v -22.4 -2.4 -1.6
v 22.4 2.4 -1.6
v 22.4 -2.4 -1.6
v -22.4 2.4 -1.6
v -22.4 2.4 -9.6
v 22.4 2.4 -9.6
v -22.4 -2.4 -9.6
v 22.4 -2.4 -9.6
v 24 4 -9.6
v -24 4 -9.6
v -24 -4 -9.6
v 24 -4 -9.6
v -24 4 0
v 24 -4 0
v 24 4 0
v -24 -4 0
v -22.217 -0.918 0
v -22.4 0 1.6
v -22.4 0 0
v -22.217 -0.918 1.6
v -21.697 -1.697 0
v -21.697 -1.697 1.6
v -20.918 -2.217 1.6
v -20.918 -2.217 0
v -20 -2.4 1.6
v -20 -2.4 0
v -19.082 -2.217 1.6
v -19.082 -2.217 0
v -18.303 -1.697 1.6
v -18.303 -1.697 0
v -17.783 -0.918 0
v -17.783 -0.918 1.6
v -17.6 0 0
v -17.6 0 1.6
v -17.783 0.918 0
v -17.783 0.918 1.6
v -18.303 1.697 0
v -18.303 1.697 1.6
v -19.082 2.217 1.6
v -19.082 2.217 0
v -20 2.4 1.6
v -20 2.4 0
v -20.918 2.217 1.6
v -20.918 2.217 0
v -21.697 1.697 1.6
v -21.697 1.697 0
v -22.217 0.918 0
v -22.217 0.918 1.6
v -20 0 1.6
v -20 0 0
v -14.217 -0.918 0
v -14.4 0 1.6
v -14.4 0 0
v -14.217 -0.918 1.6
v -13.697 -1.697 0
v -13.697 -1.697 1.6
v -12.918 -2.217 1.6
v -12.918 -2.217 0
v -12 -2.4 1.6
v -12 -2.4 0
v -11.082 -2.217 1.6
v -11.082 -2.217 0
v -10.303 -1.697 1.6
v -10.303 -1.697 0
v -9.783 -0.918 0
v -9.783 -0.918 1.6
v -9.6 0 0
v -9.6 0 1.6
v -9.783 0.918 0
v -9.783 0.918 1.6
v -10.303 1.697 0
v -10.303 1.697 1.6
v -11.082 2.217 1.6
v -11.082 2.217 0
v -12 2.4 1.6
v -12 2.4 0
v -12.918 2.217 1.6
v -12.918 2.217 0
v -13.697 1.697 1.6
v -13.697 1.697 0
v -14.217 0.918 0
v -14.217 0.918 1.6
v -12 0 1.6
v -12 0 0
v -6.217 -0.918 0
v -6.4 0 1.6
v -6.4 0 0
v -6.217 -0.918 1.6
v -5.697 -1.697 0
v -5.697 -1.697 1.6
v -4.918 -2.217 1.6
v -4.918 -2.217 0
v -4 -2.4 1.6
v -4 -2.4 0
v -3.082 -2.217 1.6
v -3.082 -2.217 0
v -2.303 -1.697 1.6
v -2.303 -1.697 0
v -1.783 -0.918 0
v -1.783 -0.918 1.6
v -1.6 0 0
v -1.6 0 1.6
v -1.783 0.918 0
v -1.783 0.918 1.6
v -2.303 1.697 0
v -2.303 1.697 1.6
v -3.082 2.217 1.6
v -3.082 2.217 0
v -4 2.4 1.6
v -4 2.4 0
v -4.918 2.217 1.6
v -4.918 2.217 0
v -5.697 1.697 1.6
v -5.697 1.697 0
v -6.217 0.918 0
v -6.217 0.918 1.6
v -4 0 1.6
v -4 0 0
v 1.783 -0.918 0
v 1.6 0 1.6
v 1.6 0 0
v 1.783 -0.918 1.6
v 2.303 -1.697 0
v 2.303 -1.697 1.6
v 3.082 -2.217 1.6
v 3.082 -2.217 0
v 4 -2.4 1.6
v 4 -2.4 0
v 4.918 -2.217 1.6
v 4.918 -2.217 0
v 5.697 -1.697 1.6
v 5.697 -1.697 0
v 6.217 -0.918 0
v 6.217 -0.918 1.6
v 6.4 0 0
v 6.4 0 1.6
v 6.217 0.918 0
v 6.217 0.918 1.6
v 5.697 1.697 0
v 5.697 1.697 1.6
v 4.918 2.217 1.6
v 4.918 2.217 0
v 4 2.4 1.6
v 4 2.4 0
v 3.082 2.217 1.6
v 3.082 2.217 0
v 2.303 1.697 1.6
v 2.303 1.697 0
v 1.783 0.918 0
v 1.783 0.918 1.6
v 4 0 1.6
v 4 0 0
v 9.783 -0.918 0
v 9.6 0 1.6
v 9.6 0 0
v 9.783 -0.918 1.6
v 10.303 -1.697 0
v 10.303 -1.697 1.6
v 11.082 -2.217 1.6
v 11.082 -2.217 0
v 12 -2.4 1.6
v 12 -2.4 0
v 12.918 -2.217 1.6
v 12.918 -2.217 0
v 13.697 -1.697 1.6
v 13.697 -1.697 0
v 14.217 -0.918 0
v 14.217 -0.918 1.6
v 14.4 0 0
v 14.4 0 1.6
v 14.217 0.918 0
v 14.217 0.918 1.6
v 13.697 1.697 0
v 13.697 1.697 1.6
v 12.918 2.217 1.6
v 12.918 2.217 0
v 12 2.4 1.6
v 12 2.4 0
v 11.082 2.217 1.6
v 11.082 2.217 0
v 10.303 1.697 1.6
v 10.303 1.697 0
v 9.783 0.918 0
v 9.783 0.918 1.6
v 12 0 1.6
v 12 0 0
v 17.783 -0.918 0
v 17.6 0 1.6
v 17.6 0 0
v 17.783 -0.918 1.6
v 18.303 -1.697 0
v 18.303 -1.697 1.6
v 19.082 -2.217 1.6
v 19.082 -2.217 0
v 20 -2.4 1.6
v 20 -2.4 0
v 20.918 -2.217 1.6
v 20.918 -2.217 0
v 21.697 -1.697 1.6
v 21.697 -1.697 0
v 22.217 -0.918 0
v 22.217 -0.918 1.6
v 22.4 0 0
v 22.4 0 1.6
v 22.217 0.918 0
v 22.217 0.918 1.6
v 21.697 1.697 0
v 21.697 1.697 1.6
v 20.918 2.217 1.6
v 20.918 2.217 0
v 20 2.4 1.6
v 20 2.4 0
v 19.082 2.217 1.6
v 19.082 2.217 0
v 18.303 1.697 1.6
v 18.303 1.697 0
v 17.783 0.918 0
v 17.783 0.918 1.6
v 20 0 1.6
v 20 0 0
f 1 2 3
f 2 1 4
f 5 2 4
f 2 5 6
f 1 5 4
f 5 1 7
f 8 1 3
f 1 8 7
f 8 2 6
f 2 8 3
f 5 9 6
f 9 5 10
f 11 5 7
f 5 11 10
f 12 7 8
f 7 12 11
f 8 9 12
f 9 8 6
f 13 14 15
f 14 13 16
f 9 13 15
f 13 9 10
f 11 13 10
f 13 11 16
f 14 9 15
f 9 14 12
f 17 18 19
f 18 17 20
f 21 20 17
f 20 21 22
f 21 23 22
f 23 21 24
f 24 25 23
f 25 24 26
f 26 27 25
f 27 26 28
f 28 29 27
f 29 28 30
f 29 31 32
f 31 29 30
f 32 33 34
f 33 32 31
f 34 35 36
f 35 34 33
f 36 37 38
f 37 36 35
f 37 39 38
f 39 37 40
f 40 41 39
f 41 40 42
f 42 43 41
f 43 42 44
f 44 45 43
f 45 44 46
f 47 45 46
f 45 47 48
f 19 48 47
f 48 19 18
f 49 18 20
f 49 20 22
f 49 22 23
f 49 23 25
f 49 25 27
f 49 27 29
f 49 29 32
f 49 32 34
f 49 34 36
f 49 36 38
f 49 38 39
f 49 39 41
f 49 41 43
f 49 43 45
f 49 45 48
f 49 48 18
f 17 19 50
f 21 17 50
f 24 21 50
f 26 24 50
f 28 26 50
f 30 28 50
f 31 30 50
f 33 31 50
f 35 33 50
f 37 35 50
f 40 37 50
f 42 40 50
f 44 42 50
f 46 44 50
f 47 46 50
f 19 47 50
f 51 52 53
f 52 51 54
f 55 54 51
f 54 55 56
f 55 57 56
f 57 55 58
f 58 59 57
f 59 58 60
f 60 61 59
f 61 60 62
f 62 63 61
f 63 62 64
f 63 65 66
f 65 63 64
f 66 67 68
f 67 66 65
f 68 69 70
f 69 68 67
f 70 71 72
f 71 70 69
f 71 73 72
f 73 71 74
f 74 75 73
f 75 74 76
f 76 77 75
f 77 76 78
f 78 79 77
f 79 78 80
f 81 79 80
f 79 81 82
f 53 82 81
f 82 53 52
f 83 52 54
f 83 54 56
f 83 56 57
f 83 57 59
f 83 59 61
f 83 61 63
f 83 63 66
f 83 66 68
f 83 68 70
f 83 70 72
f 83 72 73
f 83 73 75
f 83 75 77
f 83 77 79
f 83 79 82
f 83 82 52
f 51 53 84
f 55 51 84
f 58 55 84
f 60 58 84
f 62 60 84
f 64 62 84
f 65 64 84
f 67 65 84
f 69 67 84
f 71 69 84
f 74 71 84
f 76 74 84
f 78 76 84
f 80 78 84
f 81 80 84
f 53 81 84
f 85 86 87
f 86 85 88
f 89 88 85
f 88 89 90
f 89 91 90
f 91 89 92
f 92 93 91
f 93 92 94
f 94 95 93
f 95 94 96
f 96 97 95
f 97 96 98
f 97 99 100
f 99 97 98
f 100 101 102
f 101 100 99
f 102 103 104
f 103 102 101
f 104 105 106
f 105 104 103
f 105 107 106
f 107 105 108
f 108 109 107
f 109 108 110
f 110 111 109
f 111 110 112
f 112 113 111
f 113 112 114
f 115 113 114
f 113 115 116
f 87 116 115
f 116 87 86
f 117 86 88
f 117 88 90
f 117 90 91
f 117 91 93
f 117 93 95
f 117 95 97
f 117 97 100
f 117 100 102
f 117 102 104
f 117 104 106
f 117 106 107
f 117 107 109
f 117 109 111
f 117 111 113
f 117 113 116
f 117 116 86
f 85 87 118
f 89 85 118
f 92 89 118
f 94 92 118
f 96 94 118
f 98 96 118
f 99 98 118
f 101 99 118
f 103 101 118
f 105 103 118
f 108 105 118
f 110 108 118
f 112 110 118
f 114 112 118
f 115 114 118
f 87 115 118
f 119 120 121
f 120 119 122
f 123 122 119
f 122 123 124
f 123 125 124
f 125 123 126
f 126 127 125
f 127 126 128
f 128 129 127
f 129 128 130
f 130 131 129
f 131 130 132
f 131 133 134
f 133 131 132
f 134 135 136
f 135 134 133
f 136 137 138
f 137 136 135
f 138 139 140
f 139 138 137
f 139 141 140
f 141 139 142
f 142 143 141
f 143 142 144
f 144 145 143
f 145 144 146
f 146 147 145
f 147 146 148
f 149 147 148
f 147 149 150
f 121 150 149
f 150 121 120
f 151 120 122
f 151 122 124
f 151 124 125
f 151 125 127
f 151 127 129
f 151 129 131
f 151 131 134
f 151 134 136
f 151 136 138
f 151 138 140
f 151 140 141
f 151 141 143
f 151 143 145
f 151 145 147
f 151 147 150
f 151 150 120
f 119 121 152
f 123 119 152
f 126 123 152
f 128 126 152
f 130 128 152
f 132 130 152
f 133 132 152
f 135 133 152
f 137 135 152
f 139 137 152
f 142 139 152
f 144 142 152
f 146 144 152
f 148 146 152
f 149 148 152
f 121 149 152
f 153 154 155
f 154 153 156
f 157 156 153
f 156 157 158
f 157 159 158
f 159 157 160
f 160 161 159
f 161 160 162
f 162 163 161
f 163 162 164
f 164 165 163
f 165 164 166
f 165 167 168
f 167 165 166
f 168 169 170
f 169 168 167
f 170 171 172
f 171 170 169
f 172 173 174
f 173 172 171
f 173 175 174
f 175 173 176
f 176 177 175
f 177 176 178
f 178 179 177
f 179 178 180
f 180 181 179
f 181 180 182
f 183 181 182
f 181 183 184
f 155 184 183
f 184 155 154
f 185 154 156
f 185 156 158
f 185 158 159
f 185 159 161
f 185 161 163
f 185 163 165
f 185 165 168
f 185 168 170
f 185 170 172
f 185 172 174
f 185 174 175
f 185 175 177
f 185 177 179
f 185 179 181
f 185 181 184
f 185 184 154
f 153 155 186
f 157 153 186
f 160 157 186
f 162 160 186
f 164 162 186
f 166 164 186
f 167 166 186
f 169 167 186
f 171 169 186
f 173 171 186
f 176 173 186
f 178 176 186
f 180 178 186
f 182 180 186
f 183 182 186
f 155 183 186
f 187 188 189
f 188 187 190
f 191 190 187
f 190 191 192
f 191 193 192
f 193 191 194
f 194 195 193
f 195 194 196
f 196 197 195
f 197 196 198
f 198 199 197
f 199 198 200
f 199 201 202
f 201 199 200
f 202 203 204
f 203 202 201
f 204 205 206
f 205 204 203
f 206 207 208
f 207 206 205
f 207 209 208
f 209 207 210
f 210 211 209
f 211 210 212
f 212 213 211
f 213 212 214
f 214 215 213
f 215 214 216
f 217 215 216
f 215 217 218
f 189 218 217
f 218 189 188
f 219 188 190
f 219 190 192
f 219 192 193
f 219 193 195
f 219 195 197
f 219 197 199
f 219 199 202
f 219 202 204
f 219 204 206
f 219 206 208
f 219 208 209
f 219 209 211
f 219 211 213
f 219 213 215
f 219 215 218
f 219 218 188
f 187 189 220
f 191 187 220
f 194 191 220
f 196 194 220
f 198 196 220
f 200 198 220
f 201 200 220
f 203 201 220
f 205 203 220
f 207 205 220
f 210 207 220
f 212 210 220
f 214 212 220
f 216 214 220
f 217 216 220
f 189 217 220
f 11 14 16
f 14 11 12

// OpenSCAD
// file: ../p/4-4edge.scad
use <../lib.scad>
function ldraw_lib__4_4edge() = [
// 0 Circle 1.0
// 0 Name: 4-4edge.dat
// 0 Author: James Jessiman
// 0 !LDRAW_ORG Primitive UPDATE 2017-01
// 0 !LICENSE Licensed under CC BY 2.0 and CC BY 4.0 : see CAreadme.txt
// 
// 0 BFC CERTIFY CCW
  [0,"BFC","CERTIFY"],
  [0,"BFC","CCW"],
// 
// 0 !HISTORY 1998-12-15 [PTadmin] Official Update 1998-10
// 0 !HISTORY 2005-12-28 [PTadmin] Official Update 2005-01
// 0 !HISTORY 2007-06-24 [PTadmin] Header formatted for Contributor Agreement
// 0 !HISTORY 2008-07-01 [PTadmin] Official Update 2008-01
// 0 !HISTORY 2017-01-15 [Steffen] BFCed
// 0 !HISTORY 2017-12-30 [PTadmin] Official Update 2017-01
// 
// 
// 2 24 1 0 0 0.9239 0 0.3827
  [2,24,1,0,0,0.9239,0,0.3827],
// 2 24 0.9239 0 0.3827 0.7071 0 0.7071
  [2,24,0.9239,0,0.3827,0.7071,0,0.7071],
// 2 24 0.7071 0 0.7071 0.3827 0 0.9239
  [2,24,0.7071,0,0.7071,0.3827,0,0.9239],
// 2 24 0.3827 0 0.9239 0 0 1
  [2,24,0.3827,0,0.9239,0,0,1],
// 2 24 0 0 1 -0.3827 0 0.9239
  [2,24,0,0,1,-0.3827,0,0.9239],
// 2 24 -0.3827 0 0.9239 -0.7071 0 0.7071
  [2,24,-0.3827,0,0.9239,-0.7071,0,0.7071],
// 2 24 -0.7071 0 0.7071 -0.9239 0 0.3827
  [2,24,-0.7071,0,0.7071,-0.9239,0,0.3827],
// 2 24 -0.9239 0 0.3827 -1 0 -0
  [2,24,-0.9239,0,0.3827,-1,0,-0],
// 2 24 -1 0 -0 -0.9239 0 -0.3827
  [2,24,-1,0,-0,-0.9239,0,-0.3827],
// 2 24 -0.9239 0 -0.3827 -0.7071 0 -0.7071
  [2,24,-0.9239,0,-0.3827,-0.7071,0,-0.7071],
// 2 24 -0.7071 0 -0.7071 -0.3827 0 -0.9239
  [2,24,-0.7071,0,-0.7071,-0.3827,0,-0.9239],
// 2 24 -0.3827 0 -0.9239 0 0 -1
  [2,24,-0.3827,0,-0.9239,0,0,-1],
// 2 24 0 0 -1 0.3827 0 -0.9239
  [2,24,0,0,-1,0.3827,0,-0.9239],
// 2 24 0.3827 0 -0.9239 0.7071 0 -0.7071
  [2,24,0.3827,0,-0.9239,0.7071,0,-0.7071],
// 2 24 0.7071 0 -0.7071 0.9239 0 -0.3827
  [2,24,0.7071,0,-0.7071,0.9239,0,-0.3827],
// 2 24 0.9239 0 -0.3827 1 0 0
  [2,24,0.9239,0,-0.3827,1,0,0],
];
module ldraw_lib__4_4edge(step=0, col=false, unit=2/5, alt=false, line=0.2, solid=!$preview)
    makepoly(ldraw_lib__4_4edge(), step=step, col=col, unit=unit, alt=alt, line=line, solid=solid);
ldraw_lib__4_4edge(line=0.2);
// file: ../p/4-4disc.scad
use <../lib.scad>
function ldraw_lib__4_4disc() = [
// 0 Disc 1.0
// 0 Name: 4-4disc.dat
// 0 Author: James Jessiman
// 0 !LDRAW_ORG Primitive UPDATE 2002-02
// 0 !LICENSE Licensed under CC BY 2.0 and CC BY 4.0 : see CAreadme.txt
// 
// 0 BFC CERTIFY CCW
  [0,"BFC","CERTIFY"],
  [0,"BFC","CCW"],
// 
// 0 !HISTORY 1998-12-15 [PTadmin] Official Update 1998-10
// 0 !HISTORY 2002-03-23 [sbliss] Added BFC statement
// 0 !HISTORY 2002-04-25 [PTadmin] Official Update 2002-02
// 0 !HISTORY 2007-06-24 [PTadmin] Header formatted for Contributor Agreement
// 0 !HISTORY 2008-07-01 [PTadmin] Official Update 2008-01
// 
// 
// 3 16 0 0 0 1 0 0 0.9239 0 0.3827
  [3,16,0,0,0,1,0,0,0.9239,0,0.3827],
// 3 16 0 0 0 0.9239 0 0.3827 0.7071 0 0.7071
  [3,16,0,0,0,0.9239,0,0.3827,0.7071,0,0.7071],
// 3 16 0 0 0 0.7071 0 0.7071 0.3827 0 0.9239
  [3,16,0,0,0,0.7071,0,0.7071,0.3827,0,0.9239],
// 3 16 0 0 0 0.3827 0 0.9239 0 0 1
  [3,16,0,0,0,0.3827,0,0.9239,0,0,1],
// 3 16 0 0 0 0 0 1 -0.3827 0 0.9239
  [3,16,0,0,0,0,0,1,-0.3827,0,0.9239],
// 3 16 0 0 0 -0.3827 0 0.9239 -0.7071 0 0.7071
  [3,16,0,0,0,-0.3827,0,0.9239,-0.7071,0,0.7071],
// 3 16 0 0 0 -0.7071 0 0.7071 -0.9239 0 0.3827
  [3,16,0,0,0,-0.7071,0,0.7071,-0.9239,0,0.3827],
// 3 16 0 0 0 -0.9239 0 0.3827 -1 0 -0
  [3,16,0,0,0,-0.9239,0,0.3827,-1,0,-0],
// 3 16 0 0 0 -1 0 -0 -0.9239 0 -0.3827
  [3,16,0,0,0,-1,0,-0,-0.9239,0,-0.3827],
// 3 16 0 0 0 -0.9239 0 -0.3827 -0.7071 0 -0.7071
  [3,16,0,0,0,-0.9239,0,-0.3827,-0.7071,0,-0.7071],
// 3 16 0 0 0 -0.7071 0 -0.7071 -0.3827 0 -0.9239
  [3,16,0,0,0,-0.7071,0,-0.7071,-0.3827,0,-0.9239],
// 3 16 0 0 0 -0.3827 0 -0.9239 0 0 -1
  [3,16,0,0,0,-0.3827,0,-0.9239,0,0,-1],
// 3 16 0 0 0 0 0 -1 0.3827 0 -0.9239
  [3,16,0,0,0,0,0,-1,0.3827,0,-0.9239],
// 3 16 0 0 0 0.3827 0 -0.9239 0.7071 0 -0.7071
  [3,16,0,0,0,0.3827,0,-0.9239,0.7071,0,-0.7071],
// 3 16 0 0 0 0.7071 0 -0.7071 0.9239 0 -0.3827
  [3,16,0,0,0,0.7071,0,-0.7071,0.9239,0,-0.3827],
// 3 16 0 0 0 0.9239 0 -0.3827 1 0 0
  [3,16,0,0,0,0.9239,0,-0.3827,1,0,0],
// 0
];
module ldraw_lib__4_4disc(step=0, col=false, unit=2/5, alt=false, line=0.2, solid=!$preview)
    makepoly(ldraw_lib__4_4disc(), step=step, col=col, unit=unit, alt=alt, line=line, solid=solid);
ldraw_lib__4_4disc(line=0.2);
// file: ../p/4-4cyli.scad
use <../lib.scad>
$fa=1; $fs=0.2;
function ldraw_lib__4_4cyli(realsolid=false) = [
// 0 Cylinder 1.0
// 0 Name: 4-4cyli.dat
// 0 Author: James Jessiman
// 0 !LDRAW_ORG Primitive UPDATE 2005-01
// 0 !LICENSE Licensed under CC BY 2.0 and CC BY 4.0 : see CAreadme.txt
// 
// 0 BFC CERTIFY CCW
  [0,"BFC","CERTIFY"],
  [0,"BFC","CCW"],
// 
// 0 !HISTORY 1998-12-15 [PTadmin] Official Update 1998-10
// 0 !HISTORY 2002-03-23 [sbliss] Added BFC statement; merged headers from files in distributions LDraw 0.27 and Complete.
// 0 !HISTORY 2002-04-25 [PTadmin] Official Update 2002-02
// 0 !HISTORY 2004-12-14 [guyvivan] BFC CCW
// 0 !HISTORY 2005-12-28 [PTadmin] Official Update 2005-01
// 0 !HISTORY 2007-06-24 [PTadmin] Header formatted for Contributor Agreement
// 0 !HISTORY 2008-07-01 [PTadmin] Official Update 2008-01
// 
// 
// 4 16 1 1 0 0.9239 1 0.3827 0.9239 0 0.3827 1 0 0
  [4,16,1,1,0,0.9239,1,0.3827,0.9239,0,0.3827,1,0,0],
// 5 24 1 0 0 1 1 0 0.9239 0 0.3827 0.9239 0 -0.3827
  [5,24,1,0,0,1,1,0,0.9239,0,0.3827,0.9239,0,-0.3827],
// 4 16 0.9239 1 0.3827 0.7071 1 0.7071 0.7071 0 0.7071 0.9239 0 0.3827
  [4,16,0.9239,1,0.3827,0.7071,1,0.7071,0.7071,0,0.7071,0.9239,0,0.3827],
// 5 24 0.9239 0 0.3827 0.9239 1 0.3827 0.7071 0 0.7071 1 0 0
  [5,24,0.9239,0,0.3827,0.9239,1,0.3827,0.7071,0,0.7071,1,0,0],
// 4 16 0.7071 1 0.7071 0.3827 1 0.9239 0.3827 0 0.9239 0.7071 0 0.7071
  [4,16,0.7071,1,0.7071,0.3827,1,0.9239,0.3827,0,0.9239,0.7071,0,0.7071],
// 5 24 0.7071 0 0.7071 0.7071 1 0.7071 0.3827 0 0.9239 0.9239 0 0.3827
  [5,24,0.7071,0,0.7071,0.7071,1,0.7071,0.3827,0,0.9239,0.9239,0,0.3827],
// 4 16 0.3827 1 0.9239 0 1 1 0 0 1 0.3827 0 0.9239
  [4,16,0.3827,1,0.9239,0,1,1,0,0,1,0.3827,0,0.9239],
// 5 24 0.3827 0 0.9239 0.3827 1 0.9239 0 0 1 0.7071 0 0.7071
  [5,24,0.3827,0,0.9239,0.3827,1,0.9239,0,0,1,0.7071,0,0.7071],
// 4 16 0 1 1 -0.3827 1 0.9239 -0.3827 0 0.9239 0 0 1
  [4,16,0,1,1,-0.3827,1,0.9239,-0.3827,0,0.9239,0,0,1],
// 5 24 0 0 1 0 1 1 -0.3827 0 0.9239 0.3827 0 0.9239
  [5,24,0,0,1,0,1,1,-0.3827,0,0.9239,0.3827,0,0.9239],
// 4 16 -0.3827 1 0.9239 -0.7071 1 0.7071 -0.7071 0 0.7071 -0.3827 0 0.9239
  [4,16,-0.3827,1,0.9239,-0.7071,1,0.7071,-0.7071,0,0.7071,-0.3827,0,0.9239],
// 5 24 -0.3827 0 0.9239 -0.3827 1 0.9239 -0.7071 0 0.7071 0 0 1
  [5,24,-0.3827,0,0.9239,-0.3827,1,0.9239,-0.7071,0,0.7071,0,0,1],
// 4 16 -0.7071 1 0.7071 -0.9239 1 0.3827 -0.9239 0 0.3827 -0.7071 0 0.7071
  [4,16,-0.7071,1,0.7071,-0.9239,1,0.3827,-0.9239,0,0.3827,-0.7071,0,0.7071],
// 5 24 -0.7071 0 0.7071 -0.7071 1 0.7071 -0.9239 0 0.3827 -0.3827 0 0.9239
  [5,24,-0.7071,0,0.7071,-0.7071,1,0.7071,-0.9239,0,0.3827,-0.3827,0,0.9239],
// 4 16 -0.9239 1 0.3827 -1 1 0 -1 0 0 -0.9239 0 0.3827
  [4,16,-0.9239,1,0.3827,-1,1,0,-1,0,0,-0.9239,0,0.3827],
// 5 24 -0.9239 0 0.3827 -0.9239 1 0.3827 -1 0 0 -0.7071 0 0.7071
  [5,24,-0.9239,0,0.3827,-0.9239,1,0.3827,-1,0,0,-0.7071,0,0.7071],
// 4 16 -1 1 0 -0.9239 1 -0.3827 -0.9239 0 -0.3827 -1 0 0
  [4,16,-1,1,0,-0.9239,1,-0.3827,-0.9239,0,-0.3827,-1,0,0],
// 5 24 -1 0 0 -1 1 0 -0.9239 0 -0.3827 -0.9239 0 0.3827
  [5,24,-1,0,0,-1,1,0,-0.9239,0,-0.3827,-0.9239,0,0.3827],
// 4 16 -0.9239 1 -0.3827 -0.7071 1 -0.7071 -0.7071 0 -0.7071 -0.9239 0 -0.3827
  [4,16,-0.9239,1,-0.3827,-0.7071,1,-0.7071,-0.7071,0,-0.7071,-0.9239,0,-0.3827],
// 5 24 -0.9239 0 -0.3827 -0.9239 1 -0.3827 -0.7071 0 -0.7071 -1 0 0
  [5,24,-0.9239,0,-0.3827,-0.9239,1,-0.3827,-0.7071,0,-0.7071,-1,0,0],
// 4 16 -0.7071 1 -0.7071 -0.3827 1 -0.9239 -0.3827 0 -0.9239 -0.7071 0 -0.7071
  [4,16,-0.7071,1,-0.7071,-0.3827,1,-0.9239,-0.3827,0,-0.9239,-0.7071,0,-0.7071],
// 5 24 -0.7071 0 -0.7071 -0.7071 1 -0.7071 -0.3827 0 -0.9239 -0.9239 0 -0.3827
  [5,24,-0.7071,0,-0.7071,-0.7071,1,-0.7071,-0.3827,0,-0.9239,-0.9239,0,-0.3827],
// 4 16 -0.3827 1 -0.9239 0 1 -1 0 0 -1 -0.3827 0 -0.9239
  [4,16,-0.3827,1,-0.9239,0,1,-1,0,0,-1,-0.3827,0,-0.9239],
// 5 24 -0.3827 0 -0.9239 -0.3827 1 -0.9239 0 0 -1 -0.7071 0 -0.7071
  [5,24,-0.3827,0,-0.9239,-0.3827,1,-0.9239,0,0,-1,-0.7071,0,-0.7071],
// 4 16 0 1 -1 0.3827 1 -0.9239 0.3827 0 -0.9239 0 0 -1
  [4,16,0,1,-1,0.3827,1,-0.9239,0.3827,0,-0.9239,0,0,-1],
// 5 24 0 0 -1 0 1 -1 0.3827 0 -0.9239 -0.3827 0 -0.9239
  [5,24,0,0,-1,0,1,-1,0.3827,0,-0.9239,-0.3827,0,-0.9239],
// 4 16 0.3827 1 -0.9239 0.7071 1 -0.7071 0.7071 0 -0.7071 0.3827 0 -0.9239
  [4,16,0.3827,1,-0.9239,0.7071,1,-0.7071,0.7071,0,-0.7071,0.3827,0,-0.9239],
// 5 24 0.3827 0 -0.9239 0.3827 1 -0.9239 0.7071 0 -0.7071 0 0 -1
  [5,24,0.3827,0,-0.9239,0.3827,1,-0.9239,0.7071,0,-0.7071,0,0,-1],
// 4 16 0.7071 1 -0.7071 0.9239 1 -0.3827 0.9239 0 -0.3827 0.7071 0 -0.7071
  [4,16,0.7071,1,-0.7071,0.9239,1,-0.3827,0.9239,0,-0.3827,0.7071,0,-0.7071],
// 5 24 0.7071 0 -0.7071 0.7071 1 -0.7071 0.9239 0 -0.3827 0.3827 0 -0.9239
  [5,24,0.7071,0,-0.7071,0.7071,1,-0.7071,0.9239,0,-0.3827,0.3827,0,-0.9239],
// 4 16 0.9239 1 -0.3827 1 1 0 1 0 0 0.9239 0 -0.3827
  [4,16,0.9239,1,-0.3827,1,1,0,1,0,0,0.9239,0,-0.3827],
// 5 24 0.9239 0 -0.3827 0.9239 1 -0.3827 1 0 0 0.7071 0 -0.7071
  [5,24,0.9239,0,-0.3827,0.9239,1,-0.3827,1,0,0,0.7071,0,-0.7071],
// 0
];
module ldraw_lib__4_4cyli(step=0, col=false, unit=2/5, alt=false, line=0.2, solid=!$preview)
    makepoly(ldraw_lib__4_4cyli(solid), step=step, col=col, unit=unit, alt=alt, line=line, solid=solid);
ldraw_lib__4_4cyli(line=0.2);
// file: ../p/stud.scad
use <../lib.scad>
use <4-4cyli.scad>
use <4-4disc.scad>
use <4-4edge.scad>
function ldraw_lib__stud() = [
// 0 Stud
// 0 Name: stud.dat
// 0 Author: James Jessiman
// 0 !LDRAW_ORG Primitive UPDATE 2012-01
// 0 !LICENSE Licensed under CC BY 4.0 : see CAreadme.txt
// 
// 0 BFC CERTIFY CCW
  [0,"BFC","CERTIFY"],
  [0,"BFC","CCW"],
// 
// 0 !HISTORY 2002-04-04 [sbliss] Modified for BFC compliance
// 0 !HISTORY 2002-04-25 [PTadmin] Official Update 2002-02
// 0 !HISTORY 2007-06-24 [PTadmin] Header formatted for Contributor Agreement
// 0 !HISTORY 2008-07-01 [PTadmin] Official Update 2008-01
// 0 !HISTORY 2012-02-16 [Philo] Changed to CCW
// 0 !HISTORY 2012-03-30 [PTadmin] Official Update 2012-01
// 
// 
// 1 16 0 0 0 6 0 0 0 1 0 0 0 6 4-4edge.dat
  [1,16,0,0,0,6,0,0,0,1,0,0,0,6, ldraw_lib__4_4edge()],
// 1 16 0 -4 0 6 0 0 0 1 0 0 0 6 4-4edge.dat
  [1,16,0,-4,0,6,0,0,0,1,0,0,0,6, ldraw_lib__4_4edge()],
// 1 16 0 0 0 6 0 0 0 -4 0 0 0 6 4-4cyli.dat
  [1,16,0,0,0,6,0,0,0,-4,0,0,0,6, ldraw_lib__4_4cyli()],
// 1 16 0 -4 0 6 0 0 0 1 0 0 0 6 4-4disc.dat
  [1,16,0,-4,0,6,0,0,0,1,0,0,0,6, ldraw_lib__4_4disc()],
  [-1,16,0,0,0,6,0,0,0,-1,0,0,0,6, ldraw_lib__4_4disc()],
];
module ldraw_lib__stud(step=0, col=false, unit=2/5, alt=false, line=0.2, solid=!$preview)
    makepoly(ldraw_lib__stud(), step=step, col=col, unit=unit, alt=alt, line=line, solid=solid);
ldraw_lib__stud(line=0.2);
// file: ../p/box5.scad
use <../lib.scad>
function ldraw_lib__box5() = [
// 0 Box with 5 Faces and All Edges
// 0 Name: box5.dat
// 0 Author: James Jessiman
// 0 !LDRAW_ORG Primitive UPDATE 2012-01
// 0 !LICENSE Licensed under CC BY 2.0 and CC BY 4.0 : see CAreadme.txt
// 
// 0 BFC CERTIFY CCW
  [0,"BFC","CERTIFY"],
  [0,"BFC","CCW"],
// 
// 0 !HISTORY 2002-04-03 [sbliss] Modified for BFC compliance
// 0 !HISTORY 2002-04-25 [PTadmin] Official Update 2002-02
// 0 !HISTORY 2007-06-24 [PTadmin] Header formatted for Contributor Agreement
// 0 !HISTORY 2008-07-01 [PTadmin] Official Update 2008-01
// 0 !HISTORY 2012-02-16 [Philo] Changed to CCW
// 0 !HISTORY 2012-03-30 [PTadmin] Official Update 2012-01
// 
// 
// 2 24 1 1 1 -1 1 1
  [2,24,1,1,1,-1,1,1],
// 2 24 -1 1 1 -1 1 -1
  [2,24,-1,1,1,-1,1,-1],
// 2 24 -1 1 -1 1 1 -1
  [2,24,-1,1,-1,1,1,-1],
// 2 24 1 1 -1 1 1 1
  [2,24,1,1,-1,1,1,1],
// 2 24 1 0 1 -1 0 1
  [2,24,1,0,1,-1,0,1],
// 2 24 -1 0 1 -1 0 -1
  [2,24,-1,0,1,-1,0,-1],
// 2 24 -1 0 -1 1 0 -1
  [2,24,-1,0,-1,1,0,-1],
// 2 24 1 0 -1 1 0 1
  [2,24,1,0,-1,1,0,1],
// 2 24 1 0 1 1 1 1
  [2,24,1,0,1,1,1,1],
// 2 24 -1 0 1 -1 1 1
  [2,24,-1,0,1,-1,1,1],
// 2 24 1 0 -1 1 1 -1
  [2,24,1,0,-1,1,1,-1],
// 2 24 -1 0 -1 -1 1 -1
  [2,24,-1,0,-1,-1,1,-1],
// 4 16 -1 1 1 1 1 1 1 1 -1 -1 1 -1
  [4,16,-1,1,1,1,1,1,1,1,-1,-1,1,-1],
// 4 16 -1 1 1 -1 0 1 1 0 1 1 1 1
  [4,16,-1,1,1,-1,0,1,1,0,1,1,1,1],
// 4 16 -1 1 -1 -1 0 -1 -1 0 1 -1 1 1
  [4,16,-1,1,-1,-1,0,-1,-1,0,1,-1,1,1],
// 4 16 1 1 -1 1 0 -1 -1 0 -1 -1 1 -1
  [4,16,1,1,-1,1,0,-1,-1,0,-1,-1,1,-1],
// 4 16 1 1 1 1 0 1 1 0 -1 1 1 -1
  [4,16,1,1,1,1,0,1,1,0,-1,1,1,-1],
];
makepoly(ldraw_lib__box5(), line=0.2);
// file: ../p/box4t.scad
use <../lib.scad>
function ldraw_lib__box4t() = [
// 0 Box with 4 Adjacent Faces and All Edges
// 0 Name: box4t.dat
// 0 Author: Tore Eriksson [Tore_Eriksson]
// 0 !LDRAW_ORG Primitive UPDATE 2003-02
// 0 !LICENSE Licensed under CC BY 2.0 and CC BY 4.0 : see CAreadme.txt
// 
// 0 BFC CERTIFY CCW
  [0,"BFC","CERTIFY"],
  [0,"BFC","CCW"],
// 
// 0 !HISTORY 1997-09-29 [PTadmin] Official Update 1997-15
// 0 !HISTORY 2002-08-31 [izanette] Modified with WINDZ for BFC compliance
// 0 !HISTORY 2003-08-01 [PTadmin] Official Update 2003-02
// 0 !HISTORY 2007-06-24 [PTadmin] Header formatted for Contributor Agreement
// 0 !HISTORY 2008-07-01 [PTadmin] Official Update 2008-01
// 
// 
// 2 24 1 1 1 -1 1 1
  [2,24,1,1,1,-1,1,1],
// 2 24 -1 1 1 -1 1 -1
  [2,24,-1,1,1,-1,1,-1],
// 2 24 -1 1 -1 1 1 -1
  [2,24,-1,1,-1,1,1,-1],
// 2 24 1 1 -1 1 1 1
  [2,24,1,1,-1,1,1,1],
// 2 24 1 0 1 -1 0 1
  [2,24,1,0,1,-1,0,1],
// 2 24 -1 0 1 -1 0 -1
  [2,24,-1,0,1,-1,0,-1],
// 2 24 -1 0 -1 1 0 -1
  [2,24,-1,0,-1,1,0,-1],
// 2 24 1 0 -1 1 0 1
  [2,24,1,0,-1,1,0,1],
// 2 24 1 0 1 1 1 1
  [2,24,1,0,1,1,1,1],
// 2 24 -1 0 1 -1 1 1
  [2,24,-1,0,1,-1,1,1],
// 2 24 1 0 -1 1 1 -1
  [2,24,1,0,-1,1,1,-1],
// 2 24 -1 0 -1 -1 1 -1
  [2,24,-1,0,-1,-1,1,-1],
// 4 16 1 1 1 1 1 -1 -1 1 -1 -1 1 1
  [4,16,1,1,1,1,1,-1,-1,1,-1,-1,1,1],
// 4 16 1 1 1 -1 1 1 -1 0 1 1 0 1
  [4,16,1,1,1,-1,1,1,-1,0,1,1,0,1],
// 4 16 -1 1 1 -1 1 -1 -1 0 -1 -1 0 1
  [4,16,-1,1,1,-1,1,-1,-1,0,-1,-1,0,1],
// 0 4 16 -1 1 -1 -1 0 -1 1 0 -1 1 1 -1
// 4 16 1 1 -1 1 1 1 1 0 1 1 0 -1
  [4,16,1,1,-1,1,1,1,1,0,1,1,0,-1],
// 0
];
makepoly(ldraw_lib__box4t(), line=0.2);
// file: s/3067s01.scad
use <../../lib.scad>
use <../../p/box4t.scad>
use <../../p/box5.scad>
use <../../p/stud.scad>
function ldraw_lib__s__3067s01() = [
// 0 ~Brick  1 x  6 without Center Studs and Frontside
// 0 Name: s\3067s01.dat
// 0 Author: Michael Heidemann [mikeheide]
// 0 !LDRAW_ORG Subpart UPDATE 2005-01
// 0 !LICENSE Licensed under CC BY 2.0 and CC BY 4.0 : see CAreadme.txt
// 
// 0 BFC CERTIFY CW
  [0,"BFC","CERTIFY"],
  [0,"BFC","CW"],
// 
// 0 !HISTORY 2005-12-28 [PTadmin] Official Update 2005-01
// 0 !HISTORY 2007-08-30 [PTadmin] Header formatted for Contributor Agreement
// 0 !HISTORY 2008-07-01 [PTadmin] Official Update 2008-01
// 
// 
// 0 BFC INVERTNEXT
  [0,"BFC","INVERTNEXT"],
// 1 16 0 24 0 56 0 0 0 -20 0 0 0 6 box5.dat
  [1,16,0,24,0,56,0,0,0,-20,0,0,0,6, ldraw_lib__box5()],
// 4 16 -60 24 10 -56 24 6 56 24 6 60 24 10
  [4,16,-60,24,10,-56,24,6,56,24,6,60,24,10],
// 4 16 -60 24 -10 -56 24 -6 -56 24 6 -60 24 10
  [4,16,-60,24,-10,-56,24,-6,-56,24,6,-60,24,10],
// 4 16 60 24 -10 56 24 -6 -56 24 -6 -60 24 -10
  [4,16,60,24,-10,56,24,-6,-56,24,-6,-60,24,-10],
// 4 16 60 24 10 56 24 6 56 24 -6 60 24 -10
  [4,16,60,24,10,56,24,6,56,24,-6,60,24,-10],
// 1 16 0 24 0 60 0 0 0 -24 0 0 0 10 box4t.dat
  [1,16,0,24,0,60,0,0,0,-24,0,0,0,10, ldraw_lib__box4t()],
// 1 16 -50 0 0 -1 0 0 0 1 0 0 0 -1 stud.dat
  [1,16,-50,0,0,-1,0,0,0,1,0,0,0,-1, ldraw_lib__stud()],
// 1 16 -30 0 0 -1 0 0 0 1 0 0 0 -1 stud.dat
  [1,16,-30,0,0,-1,0,0,0,1,0,0,0,-1, ldraw_lib__stud()],
// 1 16 -10 0 0 -1 0 0 0 1 0 0 0 -1 stud.dat
  [1,16,-10,0,0,-1,0,0,0,1,0,0,0,-1, ldraw_lib__stud()],
// 1 16 10 0 0 -1 0 0 0 1 0 0 0 -1 stud.dat
  [1,16,10,0,0,-1,0,0,0,1,0,0,0,-1, ldraw_lib__stud()],
// 1 16 30 0 0 -1 0 0 0 1 0 0 0 -1 stud.dat
  [1,16,30,0,0,-1,0,0,0,1,0,0,0,-1, ldraw_lib__stud()],
// 1 16 50 0 0 -1 0 0 0 1 0 0 0 -1 stud.dat
  [1,16,50,0,0,-1,0,0,0,1,0,0,0,-1, ldraw_lib__stud()],
// 0
];
module ldraw_lib__s__3067s01(step=0, col=false, unit=2/5, alt=false, line=0.2, solid=!$preview)
    makepoly(ldraw_lib__s__3067s01(), step=step, col=col, unit=unit, alt=alt, line=line, solid=solid);
ldraw_lib__s__3067s01(line=0.2);
// main file
use <../lib.scad>
use <s/3067s01.scad>
function ldraw_lib__3067a() = [
// 0 Brick  1 x  6 without Centre Studs
// 0 Name: 3067a.dat
// 0 Author: James Jessiman
// 0 !LDRAW_ORG Part UPDATE 2017-01
// 0 !LICENSE Licensed under CC BY 4.0 : see CAreadme.txt
// 
// 0 BFC CERTIFY CCW
  [0,"BFC","CERTIFY"],
  [0,"BFC","CCW"],
// 
// 0 !KEYWORDS BrickLink 3067, Rebrickable 3067
// 
// 0 !HISTORY 2007-06-10 [PTadmin] Header formatted for Contributor Agreement
// 0 !HISTORY 2008-07-01 [PTadmin] Official Update 2008-01
// 0 !HISTORY 2017-01-10 [Steffen] Renamed from 3067 to splitup in a/b variants
// 0 !HISTORY 2017-12-30 [PTadmin] Official Update 2017-01
// 
// 
// 0 // Note that this is the part variant WITHOUT internal ribs.
// 0 // The part WITH internal ribs is 3067b.dat.
// 
// 1 16 0 0 0 1 0 0 0 1 0 0 0 1 s\3067s01.dat
  [1,16,0,0,0,1,0,0,0,1,0,0,0,1, ldraw_lib__s__3067s01()],
// 4 16 -60 24 -10 60 24 -10 60 0 -10 -60 0 -10
  [4,16,-60,24,-10,60,24,-10,60,0,-10,-60,0,-10],
];
module ldraw_lib__3067a(step=0, col=false, unit=2/5, alt=false, line=0.2, solid=!$preview)
    makepoly(ldraw_lib__3067a(), step=step, col=col, unit=unit, alt=alt, line=line, solid=solid);
ldraw_lib__3067a(line=0.2);
